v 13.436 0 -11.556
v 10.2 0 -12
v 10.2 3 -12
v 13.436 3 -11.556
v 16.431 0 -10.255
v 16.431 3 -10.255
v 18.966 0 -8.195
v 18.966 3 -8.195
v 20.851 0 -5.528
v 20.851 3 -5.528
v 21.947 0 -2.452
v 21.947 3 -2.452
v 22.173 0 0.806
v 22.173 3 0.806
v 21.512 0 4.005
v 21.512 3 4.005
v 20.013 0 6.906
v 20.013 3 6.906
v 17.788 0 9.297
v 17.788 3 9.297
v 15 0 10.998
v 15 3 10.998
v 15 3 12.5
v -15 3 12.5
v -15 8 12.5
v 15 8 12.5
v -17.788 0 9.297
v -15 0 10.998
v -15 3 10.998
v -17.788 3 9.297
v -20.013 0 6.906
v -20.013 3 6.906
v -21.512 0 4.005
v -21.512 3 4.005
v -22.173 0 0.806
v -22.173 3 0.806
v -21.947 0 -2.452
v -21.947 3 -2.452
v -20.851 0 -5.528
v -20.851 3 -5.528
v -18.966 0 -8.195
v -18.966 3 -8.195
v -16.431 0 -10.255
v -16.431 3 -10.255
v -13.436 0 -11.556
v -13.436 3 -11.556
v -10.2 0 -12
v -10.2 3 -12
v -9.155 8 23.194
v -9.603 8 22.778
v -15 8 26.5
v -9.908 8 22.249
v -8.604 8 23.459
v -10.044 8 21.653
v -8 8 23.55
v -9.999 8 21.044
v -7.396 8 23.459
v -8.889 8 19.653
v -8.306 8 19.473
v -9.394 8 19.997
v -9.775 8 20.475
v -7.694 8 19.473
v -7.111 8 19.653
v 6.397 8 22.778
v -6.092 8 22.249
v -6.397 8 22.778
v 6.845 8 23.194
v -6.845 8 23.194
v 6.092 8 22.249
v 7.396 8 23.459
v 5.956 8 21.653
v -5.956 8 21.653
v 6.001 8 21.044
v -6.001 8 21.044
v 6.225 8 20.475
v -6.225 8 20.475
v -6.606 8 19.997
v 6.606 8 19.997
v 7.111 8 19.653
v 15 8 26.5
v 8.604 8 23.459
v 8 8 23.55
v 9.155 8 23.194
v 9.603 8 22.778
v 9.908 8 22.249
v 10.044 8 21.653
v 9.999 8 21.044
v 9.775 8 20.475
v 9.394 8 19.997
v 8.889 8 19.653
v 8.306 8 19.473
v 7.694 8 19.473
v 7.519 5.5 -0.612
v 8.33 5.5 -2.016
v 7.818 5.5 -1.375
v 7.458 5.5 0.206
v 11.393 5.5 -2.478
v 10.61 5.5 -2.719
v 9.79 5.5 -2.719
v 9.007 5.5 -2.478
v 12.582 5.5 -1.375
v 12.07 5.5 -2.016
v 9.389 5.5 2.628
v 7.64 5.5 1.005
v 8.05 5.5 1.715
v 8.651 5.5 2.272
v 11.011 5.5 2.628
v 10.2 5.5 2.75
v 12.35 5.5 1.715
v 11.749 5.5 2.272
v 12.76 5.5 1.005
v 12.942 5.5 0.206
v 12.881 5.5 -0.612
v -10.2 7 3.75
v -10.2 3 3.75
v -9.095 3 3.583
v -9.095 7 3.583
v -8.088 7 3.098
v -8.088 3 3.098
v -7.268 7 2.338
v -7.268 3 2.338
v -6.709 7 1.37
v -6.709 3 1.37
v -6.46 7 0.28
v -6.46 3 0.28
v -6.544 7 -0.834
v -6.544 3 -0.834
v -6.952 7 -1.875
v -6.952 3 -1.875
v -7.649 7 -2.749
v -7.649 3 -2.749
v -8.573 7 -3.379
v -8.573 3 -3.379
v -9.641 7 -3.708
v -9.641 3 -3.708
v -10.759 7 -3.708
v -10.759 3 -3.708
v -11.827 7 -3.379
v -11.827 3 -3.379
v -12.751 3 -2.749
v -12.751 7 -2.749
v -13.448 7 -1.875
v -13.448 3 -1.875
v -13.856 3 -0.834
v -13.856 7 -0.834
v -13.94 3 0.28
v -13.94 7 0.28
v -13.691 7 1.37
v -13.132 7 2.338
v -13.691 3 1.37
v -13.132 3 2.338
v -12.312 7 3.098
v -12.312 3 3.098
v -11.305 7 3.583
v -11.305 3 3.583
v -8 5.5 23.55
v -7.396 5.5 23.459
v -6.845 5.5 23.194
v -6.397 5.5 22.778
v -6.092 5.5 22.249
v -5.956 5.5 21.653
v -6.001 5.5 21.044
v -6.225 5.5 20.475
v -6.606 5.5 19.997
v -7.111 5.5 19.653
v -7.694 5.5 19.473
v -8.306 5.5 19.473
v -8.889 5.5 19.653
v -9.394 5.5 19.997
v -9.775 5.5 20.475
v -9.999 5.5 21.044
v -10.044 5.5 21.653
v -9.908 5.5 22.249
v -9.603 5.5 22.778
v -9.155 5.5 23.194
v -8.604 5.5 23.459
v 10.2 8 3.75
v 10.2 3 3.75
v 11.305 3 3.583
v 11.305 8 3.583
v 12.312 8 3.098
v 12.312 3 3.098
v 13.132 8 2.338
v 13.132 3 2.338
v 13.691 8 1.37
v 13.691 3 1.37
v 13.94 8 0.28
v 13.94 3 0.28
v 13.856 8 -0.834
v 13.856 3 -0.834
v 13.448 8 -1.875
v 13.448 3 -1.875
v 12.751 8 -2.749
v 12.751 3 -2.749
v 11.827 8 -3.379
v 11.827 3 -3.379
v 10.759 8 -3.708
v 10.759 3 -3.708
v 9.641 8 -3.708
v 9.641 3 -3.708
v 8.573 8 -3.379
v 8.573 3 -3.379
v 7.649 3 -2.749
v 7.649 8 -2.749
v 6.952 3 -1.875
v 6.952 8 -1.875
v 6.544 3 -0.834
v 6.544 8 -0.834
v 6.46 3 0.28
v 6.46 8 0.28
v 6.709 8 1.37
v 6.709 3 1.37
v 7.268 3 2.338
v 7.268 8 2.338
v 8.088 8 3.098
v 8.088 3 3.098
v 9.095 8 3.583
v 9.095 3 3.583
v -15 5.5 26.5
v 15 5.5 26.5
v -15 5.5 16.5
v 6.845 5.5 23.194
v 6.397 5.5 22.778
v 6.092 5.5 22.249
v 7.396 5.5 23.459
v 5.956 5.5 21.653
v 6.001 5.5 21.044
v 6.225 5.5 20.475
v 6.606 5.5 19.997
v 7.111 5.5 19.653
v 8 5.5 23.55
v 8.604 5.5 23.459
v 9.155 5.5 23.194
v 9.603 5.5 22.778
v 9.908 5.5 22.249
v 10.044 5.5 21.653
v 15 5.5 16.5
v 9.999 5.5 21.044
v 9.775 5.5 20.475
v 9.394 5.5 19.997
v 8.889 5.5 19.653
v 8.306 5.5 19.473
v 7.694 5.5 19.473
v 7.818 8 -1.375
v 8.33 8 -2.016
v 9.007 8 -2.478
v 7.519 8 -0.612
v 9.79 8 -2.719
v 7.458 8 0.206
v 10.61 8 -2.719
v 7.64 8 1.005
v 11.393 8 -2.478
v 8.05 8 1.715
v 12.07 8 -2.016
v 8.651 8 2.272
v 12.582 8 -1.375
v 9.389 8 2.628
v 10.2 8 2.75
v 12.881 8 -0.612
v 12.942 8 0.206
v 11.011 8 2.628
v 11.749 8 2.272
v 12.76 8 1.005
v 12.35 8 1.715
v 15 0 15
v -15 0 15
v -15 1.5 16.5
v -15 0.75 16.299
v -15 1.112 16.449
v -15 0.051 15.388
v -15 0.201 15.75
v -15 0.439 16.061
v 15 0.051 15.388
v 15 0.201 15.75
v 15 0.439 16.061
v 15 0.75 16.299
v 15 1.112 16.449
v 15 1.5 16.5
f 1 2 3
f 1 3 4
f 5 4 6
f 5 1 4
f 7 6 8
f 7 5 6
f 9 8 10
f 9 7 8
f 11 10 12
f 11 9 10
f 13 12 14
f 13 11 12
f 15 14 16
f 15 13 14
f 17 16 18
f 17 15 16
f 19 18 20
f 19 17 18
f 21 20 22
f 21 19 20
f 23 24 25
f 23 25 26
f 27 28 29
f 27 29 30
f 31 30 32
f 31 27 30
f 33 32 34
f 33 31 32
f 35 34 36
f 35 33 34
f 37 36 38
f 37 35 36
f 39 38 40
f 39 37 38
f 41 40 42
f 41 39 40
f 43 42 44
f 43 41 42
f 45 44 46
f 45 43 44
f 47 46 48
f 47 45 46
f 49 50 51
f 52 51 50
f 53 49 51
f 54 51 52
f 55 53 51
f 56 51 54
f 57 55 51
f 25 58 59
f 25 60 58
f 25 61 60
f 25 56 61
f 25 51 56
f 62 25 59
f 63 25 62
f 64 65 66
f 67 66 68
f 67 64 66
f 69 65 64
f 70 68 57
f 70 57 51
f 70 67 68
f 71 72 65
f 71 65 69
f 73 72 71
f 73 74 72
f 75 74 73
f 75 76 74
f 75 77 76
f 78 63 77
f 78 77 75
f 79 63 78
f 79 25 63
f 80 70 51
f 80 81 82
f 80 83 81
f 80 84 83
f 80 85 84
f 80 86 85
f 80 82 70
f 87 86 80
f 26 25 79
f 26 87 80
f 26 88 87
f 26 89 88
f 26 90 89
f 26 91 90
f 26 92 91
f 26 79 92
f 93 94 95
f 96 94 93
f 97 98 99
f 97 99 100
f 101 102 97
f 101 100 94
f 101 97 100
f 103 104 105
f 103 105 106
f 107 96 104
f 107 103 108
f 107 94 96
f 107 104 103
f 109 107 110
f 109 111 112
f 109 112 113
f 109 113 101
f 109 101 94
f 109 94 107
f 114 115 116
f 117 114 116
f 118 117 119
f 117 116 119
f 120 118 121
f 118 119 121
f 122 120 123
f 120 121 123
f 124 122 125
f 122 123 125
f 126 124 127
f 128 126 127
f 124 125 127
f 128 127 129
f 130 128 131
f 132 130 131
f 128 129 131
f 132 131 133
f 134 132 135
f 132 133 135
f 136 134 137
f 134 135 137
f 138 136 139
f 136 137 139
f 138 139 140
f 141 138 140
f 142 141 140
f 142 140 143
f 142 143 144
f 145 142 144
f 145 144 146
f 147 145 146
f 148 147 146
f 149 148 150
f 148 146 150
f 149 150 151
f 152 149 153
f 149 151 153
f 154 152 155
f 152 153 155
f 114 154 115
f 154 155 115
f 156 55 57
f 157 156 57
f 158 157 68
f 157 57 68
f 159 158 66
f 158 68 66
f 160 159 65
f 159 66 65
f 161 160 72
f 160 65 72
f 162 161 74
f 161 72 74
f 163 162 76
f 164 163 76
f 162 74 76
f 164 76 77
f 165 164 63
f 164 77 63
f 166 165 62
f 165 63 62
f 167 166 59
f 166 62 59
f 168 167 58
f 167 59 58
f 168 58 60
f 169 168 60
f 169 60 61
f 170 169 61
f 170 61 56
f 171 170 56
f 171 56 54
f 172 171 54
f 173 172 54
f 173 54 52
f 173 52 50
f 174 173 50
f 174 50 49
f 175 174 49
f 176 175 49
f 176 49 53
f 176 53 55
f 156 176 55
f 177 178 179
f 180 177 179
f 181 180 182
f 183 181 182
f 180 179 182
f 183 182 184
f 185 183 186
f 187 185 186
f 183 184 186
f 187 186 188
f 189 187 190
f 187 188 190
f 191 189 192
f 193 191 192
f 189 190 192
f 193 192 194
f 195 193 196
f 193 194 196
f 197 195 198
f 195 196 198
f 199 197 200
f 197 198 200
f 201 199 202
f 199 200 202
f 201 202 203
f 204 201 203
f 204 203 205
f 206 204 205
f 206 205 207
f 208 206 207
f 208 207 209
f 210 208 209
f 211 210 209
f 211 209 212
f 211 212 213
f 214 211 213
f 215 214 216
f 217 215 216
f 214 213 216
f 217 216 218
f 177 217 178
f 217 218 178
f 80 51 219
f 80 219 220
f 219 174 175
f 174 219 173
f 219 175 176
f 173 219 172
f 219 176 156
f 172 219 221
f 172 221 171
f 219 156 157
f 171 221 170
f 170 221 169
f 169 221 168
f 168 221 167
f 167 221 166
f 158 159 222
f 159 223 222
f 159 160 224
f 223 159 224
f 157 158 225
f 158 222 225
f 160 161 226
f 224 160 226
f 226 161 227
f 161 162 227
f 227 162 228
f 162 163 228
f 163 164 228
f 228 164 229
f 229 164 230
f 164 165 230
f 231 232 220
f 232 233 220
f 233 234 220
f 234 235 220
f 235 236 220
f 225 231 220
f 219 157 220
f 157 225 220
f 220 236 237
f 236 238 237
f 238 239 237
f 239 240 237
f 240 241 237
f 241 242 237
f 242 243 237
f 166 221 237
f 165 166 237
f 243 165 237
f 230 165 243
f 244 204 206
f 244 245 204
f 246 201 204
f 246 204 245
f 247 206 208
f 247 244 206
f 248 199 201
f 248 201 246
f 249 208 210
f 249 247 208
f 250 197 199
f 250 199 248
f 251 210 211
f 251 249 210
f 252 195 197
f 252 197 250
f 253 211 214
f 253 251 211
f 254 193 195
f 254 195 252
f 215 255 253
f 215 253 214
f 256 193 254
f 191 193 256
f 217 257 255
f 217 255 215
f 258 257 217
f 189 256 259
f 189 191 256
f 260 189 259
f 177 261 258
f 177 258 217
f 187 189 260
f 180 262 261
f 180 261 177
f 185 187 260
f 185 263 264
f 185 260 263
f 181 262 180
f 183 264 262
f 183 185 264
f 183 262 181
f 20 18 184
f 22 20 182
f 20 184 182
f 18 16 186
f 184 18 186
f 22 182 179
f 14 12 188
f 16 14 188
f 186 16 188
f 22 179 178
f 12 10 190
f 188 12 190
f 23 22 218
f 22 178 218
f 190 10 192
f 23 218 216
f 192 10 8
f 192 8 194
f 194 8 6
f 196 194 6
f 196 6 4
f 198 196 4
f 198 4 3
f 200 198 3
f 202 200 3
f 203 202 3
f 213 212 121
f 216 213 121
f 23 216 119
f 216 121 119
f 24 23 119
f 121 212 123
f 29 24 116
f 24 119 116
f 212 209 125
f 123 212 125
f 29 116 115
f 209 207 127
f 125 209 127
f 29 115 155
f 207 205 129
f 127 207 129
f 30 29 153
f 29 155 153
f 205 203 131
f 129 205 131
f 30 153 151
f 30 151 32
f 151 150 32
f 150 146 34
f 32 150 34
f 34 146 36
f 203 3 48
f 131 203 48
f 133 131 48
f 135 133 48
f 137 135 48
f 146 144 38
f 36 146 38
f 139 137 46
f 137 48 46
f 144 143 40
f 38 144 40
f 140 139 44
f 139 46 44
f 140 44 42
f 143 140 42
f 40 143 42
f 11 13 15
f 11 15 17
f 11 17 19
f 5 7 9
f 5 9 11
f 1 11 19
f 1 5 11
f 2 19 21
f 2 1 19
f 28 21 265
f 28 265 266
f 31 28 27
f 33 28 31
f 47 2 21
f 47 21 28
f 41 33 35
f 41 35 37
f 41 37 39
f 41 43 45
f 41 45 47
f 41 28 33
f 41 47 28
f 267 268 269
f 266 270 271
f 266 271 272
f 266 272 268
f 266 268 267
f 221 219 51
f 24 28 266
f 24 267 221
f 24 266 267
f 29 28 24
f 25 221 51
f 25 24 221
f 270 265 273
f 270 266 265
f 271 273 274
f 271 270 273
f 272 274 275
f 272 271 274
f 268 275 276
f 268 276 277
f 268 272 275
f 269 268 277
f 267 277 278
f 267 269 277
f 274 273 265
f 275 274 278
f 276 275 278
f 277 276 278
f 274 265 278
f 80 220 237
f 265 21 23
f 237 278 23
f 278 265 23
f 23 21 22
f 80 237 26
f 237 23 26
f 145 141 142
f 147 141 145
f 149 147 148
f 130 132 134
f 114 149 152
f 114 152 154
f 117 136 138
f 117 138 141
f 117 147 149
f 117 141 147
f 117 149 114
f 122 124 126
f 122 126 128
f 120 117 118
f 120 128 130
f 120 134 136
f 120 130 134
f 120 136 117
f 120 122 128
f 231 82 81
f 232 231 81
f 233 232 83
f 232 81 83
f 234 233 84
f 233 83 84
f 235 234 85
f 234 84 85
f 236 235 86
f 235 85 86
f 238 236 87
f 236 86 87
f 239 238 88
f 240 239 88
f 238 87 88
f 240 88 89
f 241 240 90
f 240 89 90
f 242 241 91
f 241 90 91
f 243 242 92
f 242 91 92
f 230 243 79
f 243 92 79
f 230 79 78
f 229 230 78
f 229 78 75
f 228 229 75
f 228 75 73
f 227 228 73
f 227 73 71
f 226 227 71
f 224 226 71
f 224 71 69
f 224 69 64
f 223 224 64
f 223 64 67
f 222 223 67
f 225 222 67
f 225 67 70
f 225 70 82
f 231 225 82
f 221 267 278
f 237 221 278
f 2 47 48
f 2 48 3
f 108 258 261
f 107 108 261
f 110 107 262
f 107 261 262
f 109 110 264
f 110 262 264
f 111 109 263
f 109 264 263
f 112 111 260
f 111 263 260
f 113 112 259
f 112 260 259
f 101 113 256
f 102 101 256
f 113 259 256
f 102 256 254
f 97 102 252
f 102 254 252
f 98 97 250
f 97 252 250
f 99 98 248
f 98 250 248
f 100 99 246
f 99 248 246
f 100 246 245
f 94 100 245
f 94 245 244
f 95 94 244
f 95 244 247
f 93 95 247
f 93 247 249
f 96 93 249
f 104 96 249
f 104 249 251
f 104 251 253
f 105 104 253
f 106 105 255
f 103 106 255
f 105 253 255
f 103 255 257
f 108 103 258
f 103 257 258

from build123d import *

# Parameters (mm, degrees)
BOSS_EXTRU_1_DEPTH      = 3
ESQUISSE2_R             = 3.75
BOSS_EXTRU_2_DEPTH      = 5
ESQUISSE4_W             = 30
ESQUISSE4_H             = 4
BOSS_EXTRU_3_DEPTH      = 5
ESQUISSE5_W             = 30
ESQUISSE5_H             = 2.5
BOSS_EXTRU_4_DEPTH      = 10
ESQUISSE6_R             = 2.05
ENL_V_MAT_EXTRU_3_DEPTH = 10
ESQUISSE7_R             = 2.75
ENL_V_MAT_EXTRU_4_DEPTH = 2.5
ESQUISSE8_R             = 3.75
BOSS_EXTRU_5_DEPTH      = 4
CONG_1_R                = 1.5


with BuildPart() as part:
    # Esquisse1 → Boss.-Extru.1 (new body)
    with BuildSketch(Plane(origin=(0, 0, 0), x_dir=(1, 0, 0), z_dir=(0, 1, 0))):
        with BuildLine():
            Line((-10.2, 12), (10.2, 12))
            ThreePointArc((10.2, 12), (21.946875755, 2.451715724), (15, -10.998181668))
            Line((15, -10.998181668), (15, -16.5))
            Line((15, -16.5), (-15, -16.5))
            Line((-15, -16.5), (-15, -10.998181668))
            ThreePointArc((-15, -10.998181668), (-21.946875755, 2.451715724), (-10.2, 12))
        make_face()
    extrude(amount=BOSS_EXTRU_1_DEPTH)

    # Esquisse2 → Boss.-Extru.2 (add)
    with BuildSketch(Plane(origin=(0, 3, 0), x_dir=(1, 0, 0), z_dir=(0, 1, 0))):
        with Locations(Location((10.2, 0, 0), (0, 0, 270))):
            Circle(ESQUISSE2_R)
    extrude(amount=BOSS_EXTRU_2_DEPTH)

    # Esquisse4 → Boss.-Extru.3 (add)
    with BuildSketch(Plane(origin=(0, 3, 0), x_dir=(1, 0, 0), z_dir=(0, 1, 0))):
        with Locations((0, -14.5)):
            Rectangle(ESQUISSE4_W, ESQUISSE4_H)
    extrude(amount=BOSS_EXTRU_3_DEPTH)

    # Esquisse5 → Boss.-Extru.4 (add)
    with BuildSketch(Plane.XY.offset(16.5)):
        with Locations((0, 6.75)):
            Rectangle(ESQUISSE5_W, ESQUISSE5_H)
    extrude(amount=BOSS_EXTRU_4_DEPTH)

    # Esquisse6 → Enlèv. mat.-Extru.3 (cut)
    with BuildSketch(Plane(origin=(0, 8, 0), x_dir=(1, 0, 0), z_dir=(0, 1, 0))):
        with Locations(Location((8, -21.5, 0), (0, 0, 270))):
            Circle(ESQUISSE6_R)
        with Locations(Location((-8, -21.5, 0), (0, 0, 270))):
            Circle(ESQUISSE6_R)
    extrude(amount=-ENL_V_MAT_EXTRU_3_DEPTH, mode=Mode.SUBTRACT)

    # Esquisse7 → Enlèv. mat.-Extru.4 (cut)
    with BuildSketch(Plane(origin=(0, 8, 0), x_dir=(1, 0, 0), z_dir=(0, 1, 0))):
        with Locations(Location((10.2, 0, 0), (0, 0, 270))):
            Circle(ESQUISSE7_R)
    extrude(amount=-ENL_V_MAT_EXTRU_4_DEPTH, mode=Mode.SUBTRACT)

    # Esquisse8 → Boss.-Extru.5 (add)
    with BuildSketch(Plane(origin=(0, 3, 0), x_dir=(1, 0, 0), z_dir=(0, 1, 0))):
        with Locations(Location((-10.2, 0, 0), (0, 0, 270))):
            Circle(ESQUISSE8_R)
    extrude(amount=BOSS_EXTRU_5_DEPTH)

    # Congé1
    cong_1_edges = [part.edges().sort_by_distance(p)[0] for p in [
        (0, 0, 16.5),
    ]]
    fillet(cong_1_edges, radius=CONG_1_R)


solid = part.part
